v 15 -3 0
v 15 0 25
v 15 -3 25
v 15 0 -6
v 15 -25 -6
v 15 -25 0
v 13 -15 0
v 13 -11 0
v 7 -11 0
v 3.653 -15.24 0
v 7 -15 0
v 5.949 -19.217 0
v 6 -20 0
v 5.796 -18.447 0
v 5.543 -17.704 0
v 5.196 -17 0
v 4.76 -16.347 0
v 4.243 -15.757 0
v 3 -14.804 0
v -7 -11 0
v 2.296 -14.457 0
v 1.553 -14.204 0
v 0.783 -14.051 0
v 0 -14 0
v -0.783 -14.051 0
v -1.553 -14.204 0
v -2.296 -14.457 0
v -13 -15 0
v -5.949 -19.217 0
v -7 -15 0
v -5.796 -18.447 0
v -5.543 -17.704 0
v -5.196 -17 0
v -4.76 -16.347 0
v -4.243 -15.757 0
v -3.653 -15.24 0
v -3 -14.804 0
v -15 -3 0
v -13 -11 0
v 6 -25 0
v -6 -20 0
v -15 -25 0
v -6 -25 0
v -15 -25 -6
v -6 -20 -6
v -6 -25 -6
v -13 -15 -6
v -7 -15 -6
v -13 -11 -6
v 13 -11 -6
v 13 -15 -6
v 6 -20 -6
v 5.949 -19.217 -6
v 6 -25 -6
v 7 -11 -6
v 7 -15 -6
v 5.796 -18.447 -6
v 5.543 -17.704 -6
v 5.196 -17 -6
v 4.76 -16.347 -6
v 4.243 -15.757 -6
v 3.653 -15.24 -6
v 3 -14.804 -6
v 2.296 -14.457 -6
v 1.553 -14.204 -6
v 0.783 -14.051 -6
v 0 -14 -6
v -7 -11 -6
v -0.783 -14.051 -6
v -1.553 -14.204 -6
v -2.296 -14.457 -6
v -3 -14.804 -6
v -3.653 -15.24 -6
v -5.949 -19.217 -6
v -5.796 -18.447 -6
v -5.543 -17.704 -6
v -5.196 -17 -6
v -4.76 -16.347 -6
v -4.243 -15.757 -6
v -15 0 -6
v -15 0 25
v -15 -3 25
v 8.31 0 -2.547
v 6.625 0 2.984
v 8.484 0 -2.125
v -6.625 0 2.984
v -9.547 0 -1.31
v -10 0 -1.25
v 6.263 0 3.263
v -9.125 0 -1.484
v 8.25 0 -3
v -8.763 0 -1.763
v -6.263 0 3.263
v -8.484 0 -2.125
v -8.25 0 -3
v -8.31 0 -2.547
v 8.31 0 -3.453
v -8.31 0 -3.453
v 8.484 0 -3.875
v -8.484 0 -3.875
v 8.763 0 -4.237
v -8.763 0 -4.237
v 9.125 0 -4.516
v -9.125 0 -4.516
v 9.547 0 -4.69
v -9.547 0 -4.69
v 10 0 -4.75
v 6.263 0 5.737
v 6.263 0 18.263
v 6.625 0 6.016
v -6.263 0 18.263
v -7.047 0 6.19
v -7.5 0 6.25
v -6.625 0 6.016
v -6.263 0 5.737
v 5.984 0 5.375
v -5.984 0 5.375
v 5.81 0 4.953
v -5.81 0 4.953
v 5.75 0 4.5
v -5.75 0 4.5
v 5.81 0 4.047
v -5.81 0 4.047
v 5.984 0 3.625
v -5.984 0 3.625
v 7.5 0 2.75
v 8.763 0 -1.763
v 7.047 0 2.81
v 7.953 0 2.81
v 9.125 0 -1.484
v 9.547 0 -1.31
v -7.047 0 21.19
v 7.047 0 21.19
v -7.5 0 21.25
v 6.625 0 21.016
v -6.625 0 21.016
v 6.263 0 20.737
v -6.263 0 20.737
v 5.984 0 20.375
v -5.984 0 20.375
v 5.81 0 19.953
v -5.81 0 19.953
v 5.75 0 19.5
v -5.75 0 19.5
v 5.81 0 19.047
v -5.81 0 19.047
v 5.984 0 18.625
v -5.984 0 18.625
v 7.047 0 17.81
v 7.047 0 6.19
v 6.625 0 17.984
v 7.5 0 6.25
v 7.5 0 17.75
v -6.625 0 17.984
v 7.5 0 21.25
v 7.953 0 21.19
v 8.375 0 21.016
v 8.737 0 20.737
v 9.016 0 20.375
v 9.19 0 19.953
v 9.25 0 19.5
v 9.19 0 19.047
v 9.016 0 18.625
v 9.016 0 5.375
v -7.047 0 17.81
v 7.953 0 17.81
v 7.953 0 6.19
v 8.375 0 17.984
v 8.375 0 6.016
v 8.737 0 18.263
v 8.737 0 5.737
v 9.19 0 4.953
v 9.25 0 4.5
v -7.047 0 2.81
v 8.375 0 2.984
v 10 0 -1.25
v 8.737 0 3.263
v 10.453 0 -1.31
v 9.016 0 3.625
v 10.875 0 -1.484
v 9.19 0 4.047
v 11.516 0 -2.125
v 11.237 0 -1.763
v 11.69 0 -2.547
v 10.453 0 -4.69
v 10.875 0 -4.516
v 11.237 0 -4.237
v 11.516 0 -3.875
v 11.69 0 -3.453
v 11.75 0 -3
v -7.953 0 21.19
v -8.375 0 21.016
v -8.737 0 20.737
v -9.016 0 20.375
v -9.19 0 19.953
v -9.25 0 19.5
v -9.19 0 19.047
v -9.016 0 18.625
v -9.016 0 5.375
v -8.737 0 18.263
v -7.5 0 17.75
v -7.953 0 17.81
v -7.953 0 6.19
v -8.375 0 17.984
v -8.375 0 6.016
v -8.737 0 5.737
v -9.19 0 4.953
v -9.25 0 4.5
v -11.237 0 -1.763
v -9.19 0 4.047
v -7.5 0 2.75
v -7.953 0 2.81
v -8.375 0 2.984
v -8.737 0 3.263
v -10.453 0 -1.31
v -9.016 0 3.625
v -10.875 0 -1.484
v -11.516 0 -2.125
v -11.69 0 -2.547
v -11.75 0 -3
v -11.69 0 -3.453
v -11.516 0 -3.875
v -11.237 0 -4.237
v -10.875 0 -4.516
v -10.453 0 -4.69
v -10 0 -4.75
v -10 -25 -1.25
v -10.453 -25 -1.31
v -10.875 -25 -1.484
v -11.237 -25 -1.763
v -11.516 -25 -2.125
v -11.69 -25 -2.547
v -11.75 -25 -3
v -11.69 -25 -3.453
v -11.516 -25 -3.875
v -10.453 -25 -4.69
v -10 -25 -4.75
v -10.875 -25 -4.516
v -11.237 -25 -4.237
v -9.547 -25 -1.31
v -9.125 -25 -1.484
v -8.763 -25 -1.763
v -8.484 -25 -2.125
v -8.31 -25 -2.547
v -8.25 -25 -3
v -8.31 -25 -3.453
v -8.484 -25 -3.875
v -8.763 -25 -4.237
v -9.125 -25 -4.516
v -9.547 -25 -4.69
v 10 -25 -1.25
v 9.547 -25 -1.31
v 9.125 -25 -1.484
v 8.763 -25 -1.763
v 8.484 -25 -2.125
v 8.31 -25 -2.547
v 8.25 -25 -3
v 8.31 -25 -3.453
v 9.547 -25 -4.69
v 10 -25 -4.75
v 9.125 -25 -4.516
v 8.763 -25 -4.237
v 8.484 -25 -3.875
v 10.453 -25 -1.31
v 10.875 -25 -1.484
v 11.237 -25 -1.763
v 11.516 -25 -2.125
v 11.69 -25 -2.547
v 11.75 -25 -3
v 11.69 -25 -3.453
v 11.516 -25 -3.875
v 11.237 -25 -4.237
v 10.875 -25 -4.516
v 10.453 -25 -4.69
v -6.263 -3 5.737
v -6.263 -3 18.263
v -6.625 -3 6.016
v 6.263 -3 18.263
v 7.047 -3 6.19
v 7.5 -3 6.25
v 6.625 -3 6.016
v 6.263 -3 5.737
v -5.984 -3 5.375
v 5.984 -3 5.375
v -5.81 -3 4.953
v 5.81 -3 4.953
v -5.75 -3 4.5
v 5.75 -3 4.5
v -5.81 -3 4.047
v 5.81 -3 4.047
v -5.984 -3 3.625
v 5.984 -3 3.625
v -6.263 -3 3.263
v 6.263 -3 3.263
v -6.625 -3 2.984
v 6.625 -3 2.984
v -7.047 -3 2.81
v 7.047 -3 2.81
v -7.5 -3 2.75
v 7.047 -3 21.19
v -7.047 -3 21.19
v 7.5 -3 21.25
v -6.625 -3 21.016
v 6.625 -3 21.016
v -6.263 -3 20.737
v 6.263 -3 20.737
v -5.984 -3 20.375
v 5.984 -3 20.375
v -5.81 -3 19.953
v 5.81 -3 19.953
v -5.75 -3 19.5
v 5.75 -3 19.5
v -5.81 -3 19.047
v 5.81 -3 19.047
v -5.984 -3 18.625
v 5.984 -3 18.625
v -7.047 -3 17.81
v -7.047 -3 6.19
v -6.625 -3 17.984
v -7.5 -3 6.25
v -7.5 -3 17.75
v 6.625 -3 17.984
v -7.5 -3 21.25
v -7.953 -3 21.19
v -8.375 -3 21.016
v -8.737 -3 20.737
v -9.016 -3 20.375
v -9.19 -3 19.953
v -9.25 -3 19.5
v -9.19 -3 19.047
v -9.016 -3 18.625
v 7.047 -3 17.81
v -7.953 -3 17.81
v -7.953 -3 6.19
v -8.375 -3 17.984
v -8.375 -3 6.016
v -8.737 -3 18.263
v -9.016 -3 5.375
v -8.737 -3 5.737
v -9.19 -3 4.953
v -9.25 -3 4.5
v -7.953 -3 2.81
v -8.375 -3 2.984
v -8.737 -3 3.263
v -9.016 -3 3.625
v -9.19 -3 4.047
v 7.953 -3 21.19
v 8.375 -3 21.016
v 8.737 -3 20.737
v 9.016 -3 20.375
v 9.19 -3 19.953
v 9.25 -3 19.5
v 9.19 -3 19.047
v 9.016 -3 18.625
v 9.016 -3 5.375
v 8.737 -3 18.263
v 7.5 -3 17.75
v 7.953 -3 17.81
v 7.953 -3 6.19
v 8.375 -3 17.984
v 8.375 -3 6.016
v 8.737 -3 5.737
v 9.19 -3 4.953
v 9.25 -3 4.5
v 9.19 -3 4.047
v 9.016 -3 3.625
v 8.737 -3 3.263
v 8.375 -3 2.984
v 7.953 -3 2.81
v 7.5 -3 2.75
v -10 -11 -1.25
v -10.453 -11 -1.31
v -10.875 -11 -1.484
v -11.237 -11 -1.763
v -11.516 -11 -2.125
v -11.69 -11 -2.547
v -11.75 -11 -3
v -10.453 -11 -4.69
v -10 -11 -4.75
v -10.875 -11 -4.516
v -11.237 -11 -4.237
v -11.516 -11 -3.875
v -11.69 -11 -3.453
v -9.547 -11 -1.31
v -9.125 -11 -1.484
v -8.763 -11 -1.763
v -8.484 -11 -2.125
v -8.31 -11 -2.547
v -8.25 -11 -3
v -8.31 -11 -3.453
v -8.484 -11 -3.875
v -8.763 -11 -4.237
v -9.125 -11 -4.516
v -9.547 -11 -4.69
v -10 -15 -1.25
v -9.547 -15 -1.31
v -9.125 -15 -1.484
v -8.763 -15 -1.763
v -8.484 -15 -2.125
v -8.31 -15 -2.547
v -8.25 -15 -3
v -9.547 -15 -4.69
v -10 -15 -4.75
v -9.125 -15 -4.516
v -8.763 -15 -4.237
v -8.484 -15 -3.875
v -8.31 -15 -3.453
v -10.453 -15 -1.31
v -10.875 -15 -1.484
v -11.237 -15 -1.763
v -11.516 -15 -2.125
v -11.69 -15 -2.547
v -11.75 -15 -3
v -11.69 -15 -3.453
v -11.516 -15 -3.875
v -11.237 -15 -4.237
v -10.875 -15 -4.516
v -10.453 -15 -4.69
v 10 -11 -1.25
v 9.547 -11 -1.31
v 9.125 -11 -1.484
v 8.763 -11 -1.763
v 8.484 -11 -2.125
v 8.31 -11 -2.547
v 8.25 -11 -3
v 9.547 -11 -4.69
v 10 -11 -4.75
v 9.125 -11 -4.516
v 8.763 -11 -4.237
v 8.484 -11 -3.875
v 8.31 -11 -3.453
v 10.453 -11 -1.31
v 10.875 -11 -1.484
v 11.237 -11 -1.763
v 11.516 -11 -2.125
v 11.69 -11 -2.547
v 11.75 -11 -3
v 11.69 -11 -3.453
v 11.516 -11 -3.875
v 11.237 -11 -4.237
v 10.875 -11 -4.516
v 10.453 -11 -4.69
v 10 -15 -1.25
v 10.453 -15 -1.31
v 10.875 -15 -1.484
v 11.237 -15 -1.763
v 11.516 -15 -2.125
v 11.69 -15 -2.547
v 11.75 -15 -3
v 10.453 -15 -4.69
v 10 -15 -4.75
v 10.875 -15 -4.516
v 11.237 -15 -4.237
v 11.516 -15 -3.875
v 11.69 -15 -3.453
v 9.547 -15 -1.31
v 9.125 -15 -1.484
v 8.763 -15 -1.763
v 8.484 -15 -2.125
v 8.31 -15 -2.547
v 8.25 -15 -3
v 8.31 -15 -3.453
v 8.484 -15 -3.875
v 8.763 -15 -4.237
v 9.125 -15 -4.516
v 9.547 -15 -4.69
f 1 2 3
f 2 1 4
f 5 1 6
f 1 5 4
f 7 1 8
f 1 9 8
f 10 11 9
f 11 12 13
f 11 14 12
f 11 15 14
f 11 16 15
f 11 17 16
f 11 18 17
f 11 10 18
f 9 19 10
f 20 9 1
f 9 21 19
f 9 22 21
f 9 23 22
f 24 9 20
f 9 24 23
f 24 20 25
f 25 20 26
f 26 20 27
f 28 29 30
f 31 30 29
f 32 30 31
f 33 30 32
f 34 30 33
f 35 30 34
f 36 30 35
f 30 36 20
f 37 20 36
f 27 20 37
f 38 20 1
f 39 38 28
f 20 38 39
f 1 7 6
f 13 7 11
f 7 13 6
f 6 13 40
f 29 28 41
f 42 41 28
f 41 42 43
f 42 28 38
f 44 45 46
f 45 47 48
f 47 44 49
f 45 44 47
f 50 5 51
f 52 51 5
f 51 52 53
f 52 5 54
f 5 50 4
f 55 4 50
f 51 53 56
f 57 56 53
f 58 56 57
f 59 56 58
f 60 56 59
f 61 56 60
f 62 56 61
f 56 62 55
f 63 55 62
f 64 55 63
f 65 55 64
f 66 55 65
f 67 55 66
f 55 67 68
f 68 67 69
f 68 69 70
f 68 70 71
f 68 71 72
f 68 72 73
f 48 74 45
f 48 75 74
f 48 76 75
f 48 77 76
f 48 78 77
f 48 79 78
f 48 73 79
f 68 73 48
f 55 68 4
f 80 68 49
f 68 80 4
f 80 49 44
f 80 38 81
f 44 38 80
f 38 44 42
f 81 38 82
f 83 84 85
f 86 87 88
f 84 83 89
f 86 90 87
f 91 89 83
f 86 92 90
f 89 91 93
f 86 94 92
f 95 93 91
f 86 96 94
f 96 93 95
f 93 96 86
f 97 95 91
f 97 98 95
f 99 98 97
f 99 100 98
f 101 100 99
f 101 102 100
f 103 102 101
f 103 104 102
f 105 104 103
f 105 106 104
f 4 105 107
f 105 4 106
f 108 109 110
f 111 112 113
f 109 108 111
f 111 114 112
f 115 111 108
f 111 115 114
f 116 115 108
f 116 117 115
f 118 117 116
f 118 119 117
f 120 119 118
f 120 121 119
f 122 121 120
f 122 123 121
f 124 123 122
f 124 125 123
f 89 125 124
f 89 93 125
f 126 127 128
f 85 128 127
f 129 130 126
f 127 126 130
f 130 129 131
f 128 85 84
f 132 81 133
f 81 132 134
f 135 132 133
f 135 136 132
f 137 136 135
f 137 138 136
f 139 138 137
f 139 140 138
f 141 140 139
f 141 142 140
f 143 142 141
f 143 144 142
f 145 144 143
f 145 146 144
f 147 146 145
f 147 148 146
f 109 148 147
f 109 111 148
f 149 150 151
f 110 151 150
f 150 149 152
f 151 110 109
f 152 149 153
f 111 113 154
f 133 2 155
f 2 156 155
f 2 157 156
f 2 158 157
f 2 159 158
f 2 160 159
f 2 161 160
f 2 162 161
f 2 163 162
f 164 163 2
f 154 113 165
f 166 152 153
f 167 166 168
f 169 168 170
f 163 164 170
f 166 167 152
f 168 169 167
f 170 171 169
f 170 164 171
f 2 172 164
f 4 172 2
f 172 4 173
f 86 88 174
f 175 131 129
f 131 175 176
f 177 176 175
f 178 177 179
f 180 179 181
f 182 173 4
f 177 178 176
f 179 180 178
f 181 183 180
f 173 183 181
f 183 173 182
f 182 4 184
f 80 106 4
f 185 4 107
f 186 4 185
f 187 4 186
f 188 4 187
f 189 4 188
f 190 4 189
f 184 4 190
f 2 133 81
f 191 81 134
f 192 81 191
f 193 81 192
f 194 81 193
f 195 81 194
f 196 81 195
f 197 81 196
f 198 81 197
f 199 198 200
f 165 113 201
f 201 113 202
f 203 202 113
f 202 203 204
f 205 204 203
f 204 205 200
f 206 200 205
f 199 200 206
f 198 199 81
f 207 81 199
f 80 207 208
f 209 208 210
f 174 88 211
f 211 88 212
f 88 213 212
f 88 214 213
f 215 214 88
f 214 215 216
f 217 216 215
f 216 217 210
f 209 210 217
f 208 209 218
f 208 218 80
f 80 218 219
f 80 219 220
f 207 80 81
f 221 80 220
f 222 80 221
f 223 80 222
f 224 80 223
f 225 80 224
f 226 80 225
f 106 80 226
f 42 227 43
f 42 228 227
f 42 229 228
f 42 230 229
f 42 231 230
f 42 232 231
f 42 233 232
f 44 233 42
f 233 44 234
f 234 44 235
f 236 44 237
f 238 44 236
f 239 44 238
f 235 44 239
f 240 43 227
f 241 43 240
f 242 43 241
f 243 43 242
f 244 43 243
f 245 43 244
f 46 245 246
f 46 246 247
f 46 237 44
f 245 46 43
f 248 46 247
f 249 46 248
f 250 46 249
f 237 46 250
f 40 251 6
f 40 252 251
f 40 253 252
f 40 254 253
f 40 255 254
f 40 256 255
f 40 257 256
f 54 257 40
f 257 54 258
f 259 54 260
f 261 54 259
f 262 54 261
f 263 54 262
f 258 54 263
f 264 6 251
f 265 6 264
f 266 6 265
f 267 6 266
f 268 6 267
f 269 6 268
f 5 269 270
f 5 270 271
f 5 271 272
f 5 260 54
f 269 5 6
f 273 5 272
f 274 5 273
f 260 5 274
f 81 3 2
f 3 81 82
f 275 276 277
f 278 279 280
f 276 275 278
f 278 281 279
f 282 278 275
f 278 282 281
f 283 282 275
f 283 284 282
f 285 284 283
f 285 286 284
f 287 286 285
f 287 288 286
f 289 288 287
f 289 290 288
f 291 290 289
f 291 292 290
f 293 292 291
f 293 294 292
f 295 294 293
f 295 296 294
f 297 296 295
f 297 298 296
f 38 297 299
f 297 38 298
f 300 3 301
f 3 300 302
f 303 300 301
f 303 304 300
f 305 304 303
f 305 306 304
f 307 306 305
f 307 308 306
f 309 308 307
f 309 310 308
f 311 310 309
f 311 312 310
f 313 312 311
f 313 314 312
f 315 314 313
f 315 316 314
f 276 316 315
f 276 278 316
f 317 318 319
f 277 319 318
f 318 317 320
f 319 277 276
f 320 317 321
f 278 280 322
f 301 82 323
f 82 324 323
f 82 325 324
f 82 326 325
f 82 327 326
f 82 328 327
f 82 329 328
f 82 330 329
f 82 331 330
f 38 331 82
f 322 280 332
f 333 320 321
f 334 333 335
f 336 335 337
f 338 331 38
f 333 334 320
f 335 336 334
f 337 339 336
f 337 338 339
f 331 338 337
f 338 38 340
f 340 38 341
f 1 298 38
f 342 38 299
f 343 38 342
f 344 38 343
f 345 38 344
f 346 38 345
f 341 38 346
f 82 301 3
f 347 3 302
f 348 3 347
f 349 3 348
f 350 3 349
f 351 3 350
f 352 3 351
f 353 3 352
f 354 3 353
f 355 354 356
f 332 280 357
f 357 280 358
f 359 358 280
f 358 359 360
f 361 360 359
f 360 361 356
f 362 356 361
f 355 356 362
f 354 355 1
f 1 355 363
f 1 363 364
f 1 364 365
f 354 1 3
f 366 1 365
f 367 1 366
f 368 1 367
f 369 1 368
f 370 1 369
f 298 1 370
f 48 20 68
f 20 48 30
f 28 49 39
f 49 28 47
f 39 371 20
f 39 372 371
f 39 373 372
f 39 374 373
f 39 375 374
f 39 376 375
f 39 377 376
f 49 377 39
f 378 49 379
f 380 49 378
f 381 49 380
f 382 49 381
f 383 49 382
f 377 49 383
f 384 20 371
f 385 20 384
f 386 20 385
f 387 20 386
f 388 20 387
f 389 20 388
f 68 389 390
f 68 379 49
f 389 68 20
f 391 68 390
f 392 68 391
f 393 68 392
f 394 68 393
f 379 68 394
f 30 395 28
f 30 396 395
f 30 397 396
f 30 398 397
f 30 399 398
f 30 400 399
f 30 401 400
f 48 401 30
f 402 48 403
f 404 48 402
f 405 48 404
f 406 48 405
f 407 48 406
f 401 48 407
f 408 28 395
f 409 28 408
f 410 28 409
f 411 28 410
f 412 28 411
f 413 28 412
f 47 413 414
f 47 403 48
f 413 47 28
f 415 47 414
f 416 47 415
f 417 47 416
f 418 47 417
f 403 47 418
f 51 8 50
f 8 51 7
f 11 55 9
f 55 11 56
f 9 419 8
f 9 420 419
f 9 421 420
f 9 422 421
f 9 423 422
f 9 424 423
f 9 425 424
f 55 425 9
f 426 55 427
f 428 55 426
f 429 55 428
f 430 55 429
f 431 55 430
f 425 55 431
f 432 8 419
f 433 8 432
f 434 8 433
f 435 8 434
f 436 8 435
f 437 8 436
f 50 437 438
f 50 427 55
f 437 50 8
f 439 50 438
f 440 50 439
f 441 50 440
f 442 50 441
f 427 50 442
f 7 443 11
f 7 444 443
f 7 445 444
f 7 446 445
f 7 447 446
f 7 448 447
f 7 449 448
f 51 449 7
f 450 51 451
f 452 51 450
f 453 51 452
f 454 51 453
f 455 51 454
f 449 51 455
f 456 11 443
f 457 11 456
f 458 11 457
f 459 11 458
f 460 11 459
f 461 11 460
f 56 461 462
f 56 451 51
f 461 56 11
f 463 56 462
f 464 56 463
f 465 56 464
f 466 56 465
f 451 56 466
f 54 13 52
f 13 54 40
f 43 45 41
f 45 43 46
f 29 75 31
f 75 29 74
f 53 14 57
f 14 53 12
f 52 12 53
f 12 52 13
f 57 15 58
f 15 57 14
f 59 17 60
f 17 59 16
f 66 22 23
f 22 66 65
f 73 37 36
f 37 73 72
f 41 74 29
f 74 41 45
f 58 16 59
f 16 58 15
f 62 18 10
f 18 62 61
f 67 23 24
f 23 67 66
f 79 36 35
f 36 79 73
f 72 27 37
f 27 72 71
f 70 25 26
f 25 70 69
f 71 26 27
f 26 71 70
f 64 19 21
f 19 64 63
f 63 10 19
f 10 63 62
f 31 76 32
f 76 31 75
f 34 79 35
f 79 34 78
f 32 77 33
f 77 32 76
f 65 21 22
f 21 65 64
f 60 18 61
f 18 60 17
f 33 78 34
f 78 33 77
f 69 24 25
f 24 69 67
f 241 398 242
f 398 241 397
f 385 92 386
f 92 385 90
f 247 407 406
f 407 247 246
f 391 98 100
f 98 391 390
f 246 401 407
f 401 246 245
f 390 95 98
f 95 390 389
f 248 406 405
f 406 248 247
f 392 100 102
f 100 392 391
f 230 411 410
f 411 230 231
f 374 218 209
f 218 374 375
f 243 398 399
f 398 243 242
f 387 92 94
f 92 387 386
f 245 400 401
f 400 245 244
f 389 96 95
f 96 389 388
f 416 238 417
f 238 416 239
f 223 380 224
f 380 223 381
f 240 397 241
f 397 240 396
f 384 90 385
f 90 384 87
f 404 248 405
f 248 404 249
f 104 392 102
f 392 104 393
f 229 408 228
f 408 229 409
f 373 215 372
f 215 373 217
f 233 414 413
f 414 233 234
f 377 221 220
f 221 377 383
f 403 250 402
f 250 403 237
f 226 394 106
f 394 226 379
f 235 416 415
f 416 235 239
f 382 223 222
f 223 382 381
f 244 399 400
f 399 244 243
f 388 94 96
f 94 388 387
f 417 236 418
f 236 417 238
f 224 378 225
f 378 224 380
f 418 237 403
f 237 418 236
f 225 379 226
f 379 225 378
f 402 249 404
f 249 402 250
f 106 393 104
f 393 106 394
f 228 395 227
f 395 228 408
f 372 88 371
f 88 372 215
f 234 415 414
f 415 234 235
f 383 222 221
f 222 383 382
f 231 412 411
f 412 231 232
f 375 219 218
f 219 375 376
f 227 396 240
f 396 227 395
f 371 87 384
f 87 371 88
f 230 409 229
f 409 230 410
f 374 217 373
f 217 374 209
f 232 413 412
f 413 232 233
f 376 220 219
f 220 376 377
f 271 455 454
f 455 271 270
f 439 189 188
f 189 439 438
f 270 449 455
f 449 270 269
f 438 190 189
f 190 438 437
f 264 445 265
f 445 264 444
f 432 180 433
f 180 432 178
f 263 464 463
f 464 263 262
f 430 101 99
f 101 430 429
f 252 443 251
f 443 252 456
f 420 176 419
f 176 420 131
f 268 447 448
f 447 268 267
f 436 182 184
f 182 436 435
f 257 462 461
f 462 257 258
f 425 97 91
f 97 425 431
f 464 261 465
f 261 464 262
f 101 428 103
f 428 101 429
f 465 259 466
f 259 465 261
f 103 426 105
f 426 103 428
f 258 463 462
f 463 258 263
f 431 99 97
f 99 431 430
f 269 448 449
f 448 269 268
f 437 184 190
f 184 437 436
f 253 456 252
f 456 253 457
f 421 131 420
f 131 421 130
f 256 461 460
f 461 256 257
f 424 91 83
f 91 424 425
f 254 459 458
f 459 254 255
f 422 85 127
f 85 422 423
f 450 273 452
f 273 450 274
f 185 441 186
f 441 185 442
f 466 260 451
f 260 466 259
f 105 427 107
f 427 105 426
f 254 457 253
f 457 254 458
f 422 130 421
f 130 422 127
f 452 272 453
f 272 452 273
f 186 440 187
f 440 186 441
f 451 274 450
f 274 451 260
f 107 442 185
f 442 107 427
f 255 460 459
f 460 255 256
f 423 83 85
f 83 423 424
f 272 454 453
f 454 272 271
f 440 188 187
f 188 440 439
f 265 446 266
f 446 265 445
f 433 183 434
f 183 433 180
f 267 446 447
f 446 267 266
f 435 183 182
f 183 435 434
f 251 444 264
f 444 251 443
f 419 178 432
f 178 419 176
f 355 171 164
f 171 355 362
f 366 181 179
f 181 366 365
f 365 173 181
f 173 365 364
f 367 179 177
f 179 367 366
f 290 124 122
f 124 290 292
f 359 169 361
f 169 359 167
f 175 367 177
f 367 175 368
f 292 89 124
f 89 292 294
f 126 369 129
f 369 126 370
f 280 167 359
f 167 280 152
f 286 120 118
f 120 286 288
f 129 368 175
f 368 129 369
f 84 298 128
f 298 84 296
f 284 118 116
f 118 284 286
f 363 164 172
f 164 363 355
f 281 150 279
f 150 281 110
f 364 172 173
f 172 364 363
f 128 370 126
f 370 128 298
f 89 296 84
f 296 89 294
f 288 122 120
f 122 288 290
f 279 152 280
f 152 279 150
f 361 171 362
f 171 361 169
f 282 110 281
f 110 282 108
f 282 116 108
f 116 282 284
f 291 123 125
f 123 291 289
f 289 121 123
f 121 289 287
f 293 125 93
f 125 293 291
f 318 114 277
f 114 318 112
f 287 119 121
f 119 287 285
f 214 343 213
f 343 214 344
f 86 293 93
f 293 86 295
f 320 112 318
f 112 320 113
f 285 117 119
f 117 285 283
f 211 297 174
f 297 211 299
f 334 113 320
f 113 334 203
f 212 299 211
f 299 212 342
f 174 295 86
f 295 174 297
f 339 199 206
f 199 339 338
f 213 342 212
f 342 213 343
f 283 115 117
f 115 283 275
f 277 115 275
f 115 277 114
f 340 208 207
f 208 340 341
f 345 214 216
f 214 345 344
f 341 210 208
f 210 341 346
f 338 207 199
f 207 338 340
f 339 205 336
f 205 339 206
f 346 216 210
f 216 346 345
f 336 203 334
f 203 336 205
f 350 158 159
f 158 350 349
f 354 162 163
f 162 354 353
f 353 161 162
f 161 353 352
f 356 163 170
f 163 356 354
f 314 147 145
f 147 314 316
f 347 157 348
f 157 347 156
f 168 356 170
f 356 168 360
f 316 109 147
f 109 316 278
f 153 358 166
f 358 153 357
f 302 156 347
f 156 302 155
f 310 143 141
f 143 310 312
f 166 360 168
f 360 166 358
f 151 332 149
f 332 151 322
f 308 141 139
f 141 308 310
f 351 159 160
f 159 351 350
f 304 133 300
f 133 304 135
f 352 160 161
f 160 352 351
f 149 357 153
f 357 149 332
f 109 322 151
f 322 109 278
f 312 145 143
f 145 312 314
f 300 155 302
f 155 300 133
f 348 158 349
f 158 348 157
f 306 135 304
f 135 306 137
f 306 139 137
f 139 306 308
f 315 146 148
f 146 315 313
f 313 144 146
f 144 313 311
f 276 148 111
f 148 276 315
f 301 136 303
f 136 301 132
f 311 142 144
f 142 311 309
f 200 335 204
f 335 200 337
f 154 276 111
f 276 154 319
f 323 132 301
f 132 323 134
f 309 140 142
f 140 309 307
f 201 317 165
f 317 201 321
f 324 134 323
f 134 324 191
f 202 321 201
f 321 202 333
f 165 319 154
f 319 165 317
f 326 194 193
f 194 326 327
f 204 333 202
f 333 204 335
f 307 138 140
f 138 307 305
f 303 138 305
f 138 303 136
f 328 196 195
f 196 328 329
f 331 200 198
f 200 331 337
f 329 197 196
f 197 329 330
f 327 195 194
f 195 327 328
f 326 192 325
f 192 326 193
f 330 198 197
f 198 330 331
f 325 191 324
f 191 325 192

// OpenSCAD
difference()
{
    union()
    {
        translate([-15,-25,-6])
            cube([30,25,6]);
        
        translate([-15,-3,0])
            cube([30,3,25]);
    }
    union()
    {
        translate([-10-3,-15,-6])
            cube([6,4,6]);
        
        translate([10-3,-15,-6])
            cube([6,4,6]);
        
        translate([-6,-25,-6])
            cube([12,5,6]);
        
        translate([0,-20,-6])
            cylinder(d=12,h=6,$fn=48);
        
        translate([-10,-25,-3])
            rotate([270,0,0])
                cylinder(d=3.5,h=40,$fn=24);
        translate([10,-25,-3])
            rotate([270,0,0])
                cylinder(d=3.5,h=40,$fn=24);
        
        
        translate([7.5,-4,12-7.5])
            rotate([270,0,0])
                cylinder(d=3.5,h=20,$fn=24);
        translate([-7.5,-4,12-7.5])
            rotate([270,0,0])
                cylinder(d=3.5,h=20,$fn=24);
        translate([7.5,-4,12+7.5])
            rotate([270,0,0])
                cylinder(d=3.5,h=20,$fn=24);
        translate([-7.5,-4,12+7.5])
            rotate([270,0,0])
                cylinder(d=3.5,h=20,$fn=24);
    }
}
